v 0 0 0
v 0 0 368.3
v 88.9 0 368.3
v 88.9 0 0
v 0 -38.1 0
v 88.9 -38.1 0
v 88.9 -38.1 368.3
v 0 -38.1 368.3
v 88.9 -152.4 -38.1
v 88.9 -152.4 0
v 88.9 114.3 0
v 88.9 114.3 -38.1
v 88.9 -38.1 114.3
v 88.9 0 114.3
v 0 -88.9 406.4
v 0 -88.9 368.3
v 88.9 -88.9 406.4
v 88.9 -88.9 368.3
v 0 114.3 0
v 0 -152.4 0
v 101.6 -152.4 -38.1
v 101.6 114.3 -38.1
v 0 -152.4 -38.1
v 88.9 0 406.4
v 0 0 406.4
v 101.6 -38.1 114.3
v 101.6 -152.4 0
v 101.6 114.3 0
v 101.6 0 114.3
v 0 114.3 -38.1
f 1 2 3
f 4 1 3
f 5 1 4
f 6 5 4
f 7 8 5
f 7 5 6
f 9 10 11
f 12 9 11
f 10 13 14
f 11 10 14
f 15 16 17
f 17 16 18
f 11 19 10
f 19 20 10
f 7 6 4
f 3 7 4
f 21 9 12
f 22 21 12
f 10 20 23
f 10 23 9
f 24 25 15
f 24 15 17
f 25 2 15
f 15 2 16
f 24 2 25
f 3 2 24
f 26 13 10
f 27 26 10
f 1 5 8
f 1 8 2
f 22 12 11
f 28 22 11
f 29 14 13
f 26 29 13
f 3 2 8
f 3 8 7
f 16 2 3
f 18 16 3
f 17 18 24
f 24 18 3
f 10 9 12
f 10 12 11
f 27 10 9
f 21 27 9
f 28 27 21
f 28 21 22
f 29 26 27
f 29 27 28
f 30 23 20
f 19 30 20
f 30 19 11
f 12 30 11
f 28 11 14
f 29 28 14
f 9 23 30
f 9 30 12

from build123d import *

# Parameters (mm, degrees)
F0_W          = 88.9
F0_H          = 38.1
F1_DEPTH      = 368.3
F2_W          = 88.9
F2_H          = 38.1
F2_H_2        = 50.8
F3_DEPTH      = 38.1
F4_W          = 88.9
F4_H          = 38.1
F5_DEPTH      = 152.4
F5_DEPTH_BACK = 114.3
F7_DEPTH      = 12.7


with BuildPart() as f1:
    # F0 (on Top) → F1 (new body)
    with BuildSketch(Plane.XY):
        with Locations((44.45, -19.05)):
            Rectangle(F0_W, F0_H)
    extrude(amount=F1_DEPTH)


with BuildPart() as f3:
    # F2 (on face) → F3 (new body)
    with BuildSketch(Plane.XY.offset(368.3)):
        with Locations((44.45, -19.05)):
            Rectangle(F2_W, F2_H)
        with Locations((44.45, -63.5)):
            Rectangle(F2_W, F2_H_2)
    extrude(amount=F3_DEPTH)


with BuildPart() as f5:
    # F4 (on Front) → F5 (new body, two sides)
    with BuildSketch(Plane.XZ) as f5_sk:
        with Locations((44.45, -19.05)):
            Rectangle(F4_W, F4_H)
    extrude(amount=F5_DEPTH)
    extrude(f5_sk.sketch, amount=-F5_DEPTH_BACK)


with BuildPart() as f7:
    # F6 (on face) → F7 (new body)
    with BuildSketch(Plane.YZ.offset(88.9)):
        Polygon((-152.4, 0), (-152.4, -38.1), (114.3, -38.1), (114.3, 0), (0, 114.3), (-38.1, 114.3), align=None)
    extrude(amount=F7_DEPTH)


solid = Compound([f1.part, f3.part, f5.part, f7.part])
